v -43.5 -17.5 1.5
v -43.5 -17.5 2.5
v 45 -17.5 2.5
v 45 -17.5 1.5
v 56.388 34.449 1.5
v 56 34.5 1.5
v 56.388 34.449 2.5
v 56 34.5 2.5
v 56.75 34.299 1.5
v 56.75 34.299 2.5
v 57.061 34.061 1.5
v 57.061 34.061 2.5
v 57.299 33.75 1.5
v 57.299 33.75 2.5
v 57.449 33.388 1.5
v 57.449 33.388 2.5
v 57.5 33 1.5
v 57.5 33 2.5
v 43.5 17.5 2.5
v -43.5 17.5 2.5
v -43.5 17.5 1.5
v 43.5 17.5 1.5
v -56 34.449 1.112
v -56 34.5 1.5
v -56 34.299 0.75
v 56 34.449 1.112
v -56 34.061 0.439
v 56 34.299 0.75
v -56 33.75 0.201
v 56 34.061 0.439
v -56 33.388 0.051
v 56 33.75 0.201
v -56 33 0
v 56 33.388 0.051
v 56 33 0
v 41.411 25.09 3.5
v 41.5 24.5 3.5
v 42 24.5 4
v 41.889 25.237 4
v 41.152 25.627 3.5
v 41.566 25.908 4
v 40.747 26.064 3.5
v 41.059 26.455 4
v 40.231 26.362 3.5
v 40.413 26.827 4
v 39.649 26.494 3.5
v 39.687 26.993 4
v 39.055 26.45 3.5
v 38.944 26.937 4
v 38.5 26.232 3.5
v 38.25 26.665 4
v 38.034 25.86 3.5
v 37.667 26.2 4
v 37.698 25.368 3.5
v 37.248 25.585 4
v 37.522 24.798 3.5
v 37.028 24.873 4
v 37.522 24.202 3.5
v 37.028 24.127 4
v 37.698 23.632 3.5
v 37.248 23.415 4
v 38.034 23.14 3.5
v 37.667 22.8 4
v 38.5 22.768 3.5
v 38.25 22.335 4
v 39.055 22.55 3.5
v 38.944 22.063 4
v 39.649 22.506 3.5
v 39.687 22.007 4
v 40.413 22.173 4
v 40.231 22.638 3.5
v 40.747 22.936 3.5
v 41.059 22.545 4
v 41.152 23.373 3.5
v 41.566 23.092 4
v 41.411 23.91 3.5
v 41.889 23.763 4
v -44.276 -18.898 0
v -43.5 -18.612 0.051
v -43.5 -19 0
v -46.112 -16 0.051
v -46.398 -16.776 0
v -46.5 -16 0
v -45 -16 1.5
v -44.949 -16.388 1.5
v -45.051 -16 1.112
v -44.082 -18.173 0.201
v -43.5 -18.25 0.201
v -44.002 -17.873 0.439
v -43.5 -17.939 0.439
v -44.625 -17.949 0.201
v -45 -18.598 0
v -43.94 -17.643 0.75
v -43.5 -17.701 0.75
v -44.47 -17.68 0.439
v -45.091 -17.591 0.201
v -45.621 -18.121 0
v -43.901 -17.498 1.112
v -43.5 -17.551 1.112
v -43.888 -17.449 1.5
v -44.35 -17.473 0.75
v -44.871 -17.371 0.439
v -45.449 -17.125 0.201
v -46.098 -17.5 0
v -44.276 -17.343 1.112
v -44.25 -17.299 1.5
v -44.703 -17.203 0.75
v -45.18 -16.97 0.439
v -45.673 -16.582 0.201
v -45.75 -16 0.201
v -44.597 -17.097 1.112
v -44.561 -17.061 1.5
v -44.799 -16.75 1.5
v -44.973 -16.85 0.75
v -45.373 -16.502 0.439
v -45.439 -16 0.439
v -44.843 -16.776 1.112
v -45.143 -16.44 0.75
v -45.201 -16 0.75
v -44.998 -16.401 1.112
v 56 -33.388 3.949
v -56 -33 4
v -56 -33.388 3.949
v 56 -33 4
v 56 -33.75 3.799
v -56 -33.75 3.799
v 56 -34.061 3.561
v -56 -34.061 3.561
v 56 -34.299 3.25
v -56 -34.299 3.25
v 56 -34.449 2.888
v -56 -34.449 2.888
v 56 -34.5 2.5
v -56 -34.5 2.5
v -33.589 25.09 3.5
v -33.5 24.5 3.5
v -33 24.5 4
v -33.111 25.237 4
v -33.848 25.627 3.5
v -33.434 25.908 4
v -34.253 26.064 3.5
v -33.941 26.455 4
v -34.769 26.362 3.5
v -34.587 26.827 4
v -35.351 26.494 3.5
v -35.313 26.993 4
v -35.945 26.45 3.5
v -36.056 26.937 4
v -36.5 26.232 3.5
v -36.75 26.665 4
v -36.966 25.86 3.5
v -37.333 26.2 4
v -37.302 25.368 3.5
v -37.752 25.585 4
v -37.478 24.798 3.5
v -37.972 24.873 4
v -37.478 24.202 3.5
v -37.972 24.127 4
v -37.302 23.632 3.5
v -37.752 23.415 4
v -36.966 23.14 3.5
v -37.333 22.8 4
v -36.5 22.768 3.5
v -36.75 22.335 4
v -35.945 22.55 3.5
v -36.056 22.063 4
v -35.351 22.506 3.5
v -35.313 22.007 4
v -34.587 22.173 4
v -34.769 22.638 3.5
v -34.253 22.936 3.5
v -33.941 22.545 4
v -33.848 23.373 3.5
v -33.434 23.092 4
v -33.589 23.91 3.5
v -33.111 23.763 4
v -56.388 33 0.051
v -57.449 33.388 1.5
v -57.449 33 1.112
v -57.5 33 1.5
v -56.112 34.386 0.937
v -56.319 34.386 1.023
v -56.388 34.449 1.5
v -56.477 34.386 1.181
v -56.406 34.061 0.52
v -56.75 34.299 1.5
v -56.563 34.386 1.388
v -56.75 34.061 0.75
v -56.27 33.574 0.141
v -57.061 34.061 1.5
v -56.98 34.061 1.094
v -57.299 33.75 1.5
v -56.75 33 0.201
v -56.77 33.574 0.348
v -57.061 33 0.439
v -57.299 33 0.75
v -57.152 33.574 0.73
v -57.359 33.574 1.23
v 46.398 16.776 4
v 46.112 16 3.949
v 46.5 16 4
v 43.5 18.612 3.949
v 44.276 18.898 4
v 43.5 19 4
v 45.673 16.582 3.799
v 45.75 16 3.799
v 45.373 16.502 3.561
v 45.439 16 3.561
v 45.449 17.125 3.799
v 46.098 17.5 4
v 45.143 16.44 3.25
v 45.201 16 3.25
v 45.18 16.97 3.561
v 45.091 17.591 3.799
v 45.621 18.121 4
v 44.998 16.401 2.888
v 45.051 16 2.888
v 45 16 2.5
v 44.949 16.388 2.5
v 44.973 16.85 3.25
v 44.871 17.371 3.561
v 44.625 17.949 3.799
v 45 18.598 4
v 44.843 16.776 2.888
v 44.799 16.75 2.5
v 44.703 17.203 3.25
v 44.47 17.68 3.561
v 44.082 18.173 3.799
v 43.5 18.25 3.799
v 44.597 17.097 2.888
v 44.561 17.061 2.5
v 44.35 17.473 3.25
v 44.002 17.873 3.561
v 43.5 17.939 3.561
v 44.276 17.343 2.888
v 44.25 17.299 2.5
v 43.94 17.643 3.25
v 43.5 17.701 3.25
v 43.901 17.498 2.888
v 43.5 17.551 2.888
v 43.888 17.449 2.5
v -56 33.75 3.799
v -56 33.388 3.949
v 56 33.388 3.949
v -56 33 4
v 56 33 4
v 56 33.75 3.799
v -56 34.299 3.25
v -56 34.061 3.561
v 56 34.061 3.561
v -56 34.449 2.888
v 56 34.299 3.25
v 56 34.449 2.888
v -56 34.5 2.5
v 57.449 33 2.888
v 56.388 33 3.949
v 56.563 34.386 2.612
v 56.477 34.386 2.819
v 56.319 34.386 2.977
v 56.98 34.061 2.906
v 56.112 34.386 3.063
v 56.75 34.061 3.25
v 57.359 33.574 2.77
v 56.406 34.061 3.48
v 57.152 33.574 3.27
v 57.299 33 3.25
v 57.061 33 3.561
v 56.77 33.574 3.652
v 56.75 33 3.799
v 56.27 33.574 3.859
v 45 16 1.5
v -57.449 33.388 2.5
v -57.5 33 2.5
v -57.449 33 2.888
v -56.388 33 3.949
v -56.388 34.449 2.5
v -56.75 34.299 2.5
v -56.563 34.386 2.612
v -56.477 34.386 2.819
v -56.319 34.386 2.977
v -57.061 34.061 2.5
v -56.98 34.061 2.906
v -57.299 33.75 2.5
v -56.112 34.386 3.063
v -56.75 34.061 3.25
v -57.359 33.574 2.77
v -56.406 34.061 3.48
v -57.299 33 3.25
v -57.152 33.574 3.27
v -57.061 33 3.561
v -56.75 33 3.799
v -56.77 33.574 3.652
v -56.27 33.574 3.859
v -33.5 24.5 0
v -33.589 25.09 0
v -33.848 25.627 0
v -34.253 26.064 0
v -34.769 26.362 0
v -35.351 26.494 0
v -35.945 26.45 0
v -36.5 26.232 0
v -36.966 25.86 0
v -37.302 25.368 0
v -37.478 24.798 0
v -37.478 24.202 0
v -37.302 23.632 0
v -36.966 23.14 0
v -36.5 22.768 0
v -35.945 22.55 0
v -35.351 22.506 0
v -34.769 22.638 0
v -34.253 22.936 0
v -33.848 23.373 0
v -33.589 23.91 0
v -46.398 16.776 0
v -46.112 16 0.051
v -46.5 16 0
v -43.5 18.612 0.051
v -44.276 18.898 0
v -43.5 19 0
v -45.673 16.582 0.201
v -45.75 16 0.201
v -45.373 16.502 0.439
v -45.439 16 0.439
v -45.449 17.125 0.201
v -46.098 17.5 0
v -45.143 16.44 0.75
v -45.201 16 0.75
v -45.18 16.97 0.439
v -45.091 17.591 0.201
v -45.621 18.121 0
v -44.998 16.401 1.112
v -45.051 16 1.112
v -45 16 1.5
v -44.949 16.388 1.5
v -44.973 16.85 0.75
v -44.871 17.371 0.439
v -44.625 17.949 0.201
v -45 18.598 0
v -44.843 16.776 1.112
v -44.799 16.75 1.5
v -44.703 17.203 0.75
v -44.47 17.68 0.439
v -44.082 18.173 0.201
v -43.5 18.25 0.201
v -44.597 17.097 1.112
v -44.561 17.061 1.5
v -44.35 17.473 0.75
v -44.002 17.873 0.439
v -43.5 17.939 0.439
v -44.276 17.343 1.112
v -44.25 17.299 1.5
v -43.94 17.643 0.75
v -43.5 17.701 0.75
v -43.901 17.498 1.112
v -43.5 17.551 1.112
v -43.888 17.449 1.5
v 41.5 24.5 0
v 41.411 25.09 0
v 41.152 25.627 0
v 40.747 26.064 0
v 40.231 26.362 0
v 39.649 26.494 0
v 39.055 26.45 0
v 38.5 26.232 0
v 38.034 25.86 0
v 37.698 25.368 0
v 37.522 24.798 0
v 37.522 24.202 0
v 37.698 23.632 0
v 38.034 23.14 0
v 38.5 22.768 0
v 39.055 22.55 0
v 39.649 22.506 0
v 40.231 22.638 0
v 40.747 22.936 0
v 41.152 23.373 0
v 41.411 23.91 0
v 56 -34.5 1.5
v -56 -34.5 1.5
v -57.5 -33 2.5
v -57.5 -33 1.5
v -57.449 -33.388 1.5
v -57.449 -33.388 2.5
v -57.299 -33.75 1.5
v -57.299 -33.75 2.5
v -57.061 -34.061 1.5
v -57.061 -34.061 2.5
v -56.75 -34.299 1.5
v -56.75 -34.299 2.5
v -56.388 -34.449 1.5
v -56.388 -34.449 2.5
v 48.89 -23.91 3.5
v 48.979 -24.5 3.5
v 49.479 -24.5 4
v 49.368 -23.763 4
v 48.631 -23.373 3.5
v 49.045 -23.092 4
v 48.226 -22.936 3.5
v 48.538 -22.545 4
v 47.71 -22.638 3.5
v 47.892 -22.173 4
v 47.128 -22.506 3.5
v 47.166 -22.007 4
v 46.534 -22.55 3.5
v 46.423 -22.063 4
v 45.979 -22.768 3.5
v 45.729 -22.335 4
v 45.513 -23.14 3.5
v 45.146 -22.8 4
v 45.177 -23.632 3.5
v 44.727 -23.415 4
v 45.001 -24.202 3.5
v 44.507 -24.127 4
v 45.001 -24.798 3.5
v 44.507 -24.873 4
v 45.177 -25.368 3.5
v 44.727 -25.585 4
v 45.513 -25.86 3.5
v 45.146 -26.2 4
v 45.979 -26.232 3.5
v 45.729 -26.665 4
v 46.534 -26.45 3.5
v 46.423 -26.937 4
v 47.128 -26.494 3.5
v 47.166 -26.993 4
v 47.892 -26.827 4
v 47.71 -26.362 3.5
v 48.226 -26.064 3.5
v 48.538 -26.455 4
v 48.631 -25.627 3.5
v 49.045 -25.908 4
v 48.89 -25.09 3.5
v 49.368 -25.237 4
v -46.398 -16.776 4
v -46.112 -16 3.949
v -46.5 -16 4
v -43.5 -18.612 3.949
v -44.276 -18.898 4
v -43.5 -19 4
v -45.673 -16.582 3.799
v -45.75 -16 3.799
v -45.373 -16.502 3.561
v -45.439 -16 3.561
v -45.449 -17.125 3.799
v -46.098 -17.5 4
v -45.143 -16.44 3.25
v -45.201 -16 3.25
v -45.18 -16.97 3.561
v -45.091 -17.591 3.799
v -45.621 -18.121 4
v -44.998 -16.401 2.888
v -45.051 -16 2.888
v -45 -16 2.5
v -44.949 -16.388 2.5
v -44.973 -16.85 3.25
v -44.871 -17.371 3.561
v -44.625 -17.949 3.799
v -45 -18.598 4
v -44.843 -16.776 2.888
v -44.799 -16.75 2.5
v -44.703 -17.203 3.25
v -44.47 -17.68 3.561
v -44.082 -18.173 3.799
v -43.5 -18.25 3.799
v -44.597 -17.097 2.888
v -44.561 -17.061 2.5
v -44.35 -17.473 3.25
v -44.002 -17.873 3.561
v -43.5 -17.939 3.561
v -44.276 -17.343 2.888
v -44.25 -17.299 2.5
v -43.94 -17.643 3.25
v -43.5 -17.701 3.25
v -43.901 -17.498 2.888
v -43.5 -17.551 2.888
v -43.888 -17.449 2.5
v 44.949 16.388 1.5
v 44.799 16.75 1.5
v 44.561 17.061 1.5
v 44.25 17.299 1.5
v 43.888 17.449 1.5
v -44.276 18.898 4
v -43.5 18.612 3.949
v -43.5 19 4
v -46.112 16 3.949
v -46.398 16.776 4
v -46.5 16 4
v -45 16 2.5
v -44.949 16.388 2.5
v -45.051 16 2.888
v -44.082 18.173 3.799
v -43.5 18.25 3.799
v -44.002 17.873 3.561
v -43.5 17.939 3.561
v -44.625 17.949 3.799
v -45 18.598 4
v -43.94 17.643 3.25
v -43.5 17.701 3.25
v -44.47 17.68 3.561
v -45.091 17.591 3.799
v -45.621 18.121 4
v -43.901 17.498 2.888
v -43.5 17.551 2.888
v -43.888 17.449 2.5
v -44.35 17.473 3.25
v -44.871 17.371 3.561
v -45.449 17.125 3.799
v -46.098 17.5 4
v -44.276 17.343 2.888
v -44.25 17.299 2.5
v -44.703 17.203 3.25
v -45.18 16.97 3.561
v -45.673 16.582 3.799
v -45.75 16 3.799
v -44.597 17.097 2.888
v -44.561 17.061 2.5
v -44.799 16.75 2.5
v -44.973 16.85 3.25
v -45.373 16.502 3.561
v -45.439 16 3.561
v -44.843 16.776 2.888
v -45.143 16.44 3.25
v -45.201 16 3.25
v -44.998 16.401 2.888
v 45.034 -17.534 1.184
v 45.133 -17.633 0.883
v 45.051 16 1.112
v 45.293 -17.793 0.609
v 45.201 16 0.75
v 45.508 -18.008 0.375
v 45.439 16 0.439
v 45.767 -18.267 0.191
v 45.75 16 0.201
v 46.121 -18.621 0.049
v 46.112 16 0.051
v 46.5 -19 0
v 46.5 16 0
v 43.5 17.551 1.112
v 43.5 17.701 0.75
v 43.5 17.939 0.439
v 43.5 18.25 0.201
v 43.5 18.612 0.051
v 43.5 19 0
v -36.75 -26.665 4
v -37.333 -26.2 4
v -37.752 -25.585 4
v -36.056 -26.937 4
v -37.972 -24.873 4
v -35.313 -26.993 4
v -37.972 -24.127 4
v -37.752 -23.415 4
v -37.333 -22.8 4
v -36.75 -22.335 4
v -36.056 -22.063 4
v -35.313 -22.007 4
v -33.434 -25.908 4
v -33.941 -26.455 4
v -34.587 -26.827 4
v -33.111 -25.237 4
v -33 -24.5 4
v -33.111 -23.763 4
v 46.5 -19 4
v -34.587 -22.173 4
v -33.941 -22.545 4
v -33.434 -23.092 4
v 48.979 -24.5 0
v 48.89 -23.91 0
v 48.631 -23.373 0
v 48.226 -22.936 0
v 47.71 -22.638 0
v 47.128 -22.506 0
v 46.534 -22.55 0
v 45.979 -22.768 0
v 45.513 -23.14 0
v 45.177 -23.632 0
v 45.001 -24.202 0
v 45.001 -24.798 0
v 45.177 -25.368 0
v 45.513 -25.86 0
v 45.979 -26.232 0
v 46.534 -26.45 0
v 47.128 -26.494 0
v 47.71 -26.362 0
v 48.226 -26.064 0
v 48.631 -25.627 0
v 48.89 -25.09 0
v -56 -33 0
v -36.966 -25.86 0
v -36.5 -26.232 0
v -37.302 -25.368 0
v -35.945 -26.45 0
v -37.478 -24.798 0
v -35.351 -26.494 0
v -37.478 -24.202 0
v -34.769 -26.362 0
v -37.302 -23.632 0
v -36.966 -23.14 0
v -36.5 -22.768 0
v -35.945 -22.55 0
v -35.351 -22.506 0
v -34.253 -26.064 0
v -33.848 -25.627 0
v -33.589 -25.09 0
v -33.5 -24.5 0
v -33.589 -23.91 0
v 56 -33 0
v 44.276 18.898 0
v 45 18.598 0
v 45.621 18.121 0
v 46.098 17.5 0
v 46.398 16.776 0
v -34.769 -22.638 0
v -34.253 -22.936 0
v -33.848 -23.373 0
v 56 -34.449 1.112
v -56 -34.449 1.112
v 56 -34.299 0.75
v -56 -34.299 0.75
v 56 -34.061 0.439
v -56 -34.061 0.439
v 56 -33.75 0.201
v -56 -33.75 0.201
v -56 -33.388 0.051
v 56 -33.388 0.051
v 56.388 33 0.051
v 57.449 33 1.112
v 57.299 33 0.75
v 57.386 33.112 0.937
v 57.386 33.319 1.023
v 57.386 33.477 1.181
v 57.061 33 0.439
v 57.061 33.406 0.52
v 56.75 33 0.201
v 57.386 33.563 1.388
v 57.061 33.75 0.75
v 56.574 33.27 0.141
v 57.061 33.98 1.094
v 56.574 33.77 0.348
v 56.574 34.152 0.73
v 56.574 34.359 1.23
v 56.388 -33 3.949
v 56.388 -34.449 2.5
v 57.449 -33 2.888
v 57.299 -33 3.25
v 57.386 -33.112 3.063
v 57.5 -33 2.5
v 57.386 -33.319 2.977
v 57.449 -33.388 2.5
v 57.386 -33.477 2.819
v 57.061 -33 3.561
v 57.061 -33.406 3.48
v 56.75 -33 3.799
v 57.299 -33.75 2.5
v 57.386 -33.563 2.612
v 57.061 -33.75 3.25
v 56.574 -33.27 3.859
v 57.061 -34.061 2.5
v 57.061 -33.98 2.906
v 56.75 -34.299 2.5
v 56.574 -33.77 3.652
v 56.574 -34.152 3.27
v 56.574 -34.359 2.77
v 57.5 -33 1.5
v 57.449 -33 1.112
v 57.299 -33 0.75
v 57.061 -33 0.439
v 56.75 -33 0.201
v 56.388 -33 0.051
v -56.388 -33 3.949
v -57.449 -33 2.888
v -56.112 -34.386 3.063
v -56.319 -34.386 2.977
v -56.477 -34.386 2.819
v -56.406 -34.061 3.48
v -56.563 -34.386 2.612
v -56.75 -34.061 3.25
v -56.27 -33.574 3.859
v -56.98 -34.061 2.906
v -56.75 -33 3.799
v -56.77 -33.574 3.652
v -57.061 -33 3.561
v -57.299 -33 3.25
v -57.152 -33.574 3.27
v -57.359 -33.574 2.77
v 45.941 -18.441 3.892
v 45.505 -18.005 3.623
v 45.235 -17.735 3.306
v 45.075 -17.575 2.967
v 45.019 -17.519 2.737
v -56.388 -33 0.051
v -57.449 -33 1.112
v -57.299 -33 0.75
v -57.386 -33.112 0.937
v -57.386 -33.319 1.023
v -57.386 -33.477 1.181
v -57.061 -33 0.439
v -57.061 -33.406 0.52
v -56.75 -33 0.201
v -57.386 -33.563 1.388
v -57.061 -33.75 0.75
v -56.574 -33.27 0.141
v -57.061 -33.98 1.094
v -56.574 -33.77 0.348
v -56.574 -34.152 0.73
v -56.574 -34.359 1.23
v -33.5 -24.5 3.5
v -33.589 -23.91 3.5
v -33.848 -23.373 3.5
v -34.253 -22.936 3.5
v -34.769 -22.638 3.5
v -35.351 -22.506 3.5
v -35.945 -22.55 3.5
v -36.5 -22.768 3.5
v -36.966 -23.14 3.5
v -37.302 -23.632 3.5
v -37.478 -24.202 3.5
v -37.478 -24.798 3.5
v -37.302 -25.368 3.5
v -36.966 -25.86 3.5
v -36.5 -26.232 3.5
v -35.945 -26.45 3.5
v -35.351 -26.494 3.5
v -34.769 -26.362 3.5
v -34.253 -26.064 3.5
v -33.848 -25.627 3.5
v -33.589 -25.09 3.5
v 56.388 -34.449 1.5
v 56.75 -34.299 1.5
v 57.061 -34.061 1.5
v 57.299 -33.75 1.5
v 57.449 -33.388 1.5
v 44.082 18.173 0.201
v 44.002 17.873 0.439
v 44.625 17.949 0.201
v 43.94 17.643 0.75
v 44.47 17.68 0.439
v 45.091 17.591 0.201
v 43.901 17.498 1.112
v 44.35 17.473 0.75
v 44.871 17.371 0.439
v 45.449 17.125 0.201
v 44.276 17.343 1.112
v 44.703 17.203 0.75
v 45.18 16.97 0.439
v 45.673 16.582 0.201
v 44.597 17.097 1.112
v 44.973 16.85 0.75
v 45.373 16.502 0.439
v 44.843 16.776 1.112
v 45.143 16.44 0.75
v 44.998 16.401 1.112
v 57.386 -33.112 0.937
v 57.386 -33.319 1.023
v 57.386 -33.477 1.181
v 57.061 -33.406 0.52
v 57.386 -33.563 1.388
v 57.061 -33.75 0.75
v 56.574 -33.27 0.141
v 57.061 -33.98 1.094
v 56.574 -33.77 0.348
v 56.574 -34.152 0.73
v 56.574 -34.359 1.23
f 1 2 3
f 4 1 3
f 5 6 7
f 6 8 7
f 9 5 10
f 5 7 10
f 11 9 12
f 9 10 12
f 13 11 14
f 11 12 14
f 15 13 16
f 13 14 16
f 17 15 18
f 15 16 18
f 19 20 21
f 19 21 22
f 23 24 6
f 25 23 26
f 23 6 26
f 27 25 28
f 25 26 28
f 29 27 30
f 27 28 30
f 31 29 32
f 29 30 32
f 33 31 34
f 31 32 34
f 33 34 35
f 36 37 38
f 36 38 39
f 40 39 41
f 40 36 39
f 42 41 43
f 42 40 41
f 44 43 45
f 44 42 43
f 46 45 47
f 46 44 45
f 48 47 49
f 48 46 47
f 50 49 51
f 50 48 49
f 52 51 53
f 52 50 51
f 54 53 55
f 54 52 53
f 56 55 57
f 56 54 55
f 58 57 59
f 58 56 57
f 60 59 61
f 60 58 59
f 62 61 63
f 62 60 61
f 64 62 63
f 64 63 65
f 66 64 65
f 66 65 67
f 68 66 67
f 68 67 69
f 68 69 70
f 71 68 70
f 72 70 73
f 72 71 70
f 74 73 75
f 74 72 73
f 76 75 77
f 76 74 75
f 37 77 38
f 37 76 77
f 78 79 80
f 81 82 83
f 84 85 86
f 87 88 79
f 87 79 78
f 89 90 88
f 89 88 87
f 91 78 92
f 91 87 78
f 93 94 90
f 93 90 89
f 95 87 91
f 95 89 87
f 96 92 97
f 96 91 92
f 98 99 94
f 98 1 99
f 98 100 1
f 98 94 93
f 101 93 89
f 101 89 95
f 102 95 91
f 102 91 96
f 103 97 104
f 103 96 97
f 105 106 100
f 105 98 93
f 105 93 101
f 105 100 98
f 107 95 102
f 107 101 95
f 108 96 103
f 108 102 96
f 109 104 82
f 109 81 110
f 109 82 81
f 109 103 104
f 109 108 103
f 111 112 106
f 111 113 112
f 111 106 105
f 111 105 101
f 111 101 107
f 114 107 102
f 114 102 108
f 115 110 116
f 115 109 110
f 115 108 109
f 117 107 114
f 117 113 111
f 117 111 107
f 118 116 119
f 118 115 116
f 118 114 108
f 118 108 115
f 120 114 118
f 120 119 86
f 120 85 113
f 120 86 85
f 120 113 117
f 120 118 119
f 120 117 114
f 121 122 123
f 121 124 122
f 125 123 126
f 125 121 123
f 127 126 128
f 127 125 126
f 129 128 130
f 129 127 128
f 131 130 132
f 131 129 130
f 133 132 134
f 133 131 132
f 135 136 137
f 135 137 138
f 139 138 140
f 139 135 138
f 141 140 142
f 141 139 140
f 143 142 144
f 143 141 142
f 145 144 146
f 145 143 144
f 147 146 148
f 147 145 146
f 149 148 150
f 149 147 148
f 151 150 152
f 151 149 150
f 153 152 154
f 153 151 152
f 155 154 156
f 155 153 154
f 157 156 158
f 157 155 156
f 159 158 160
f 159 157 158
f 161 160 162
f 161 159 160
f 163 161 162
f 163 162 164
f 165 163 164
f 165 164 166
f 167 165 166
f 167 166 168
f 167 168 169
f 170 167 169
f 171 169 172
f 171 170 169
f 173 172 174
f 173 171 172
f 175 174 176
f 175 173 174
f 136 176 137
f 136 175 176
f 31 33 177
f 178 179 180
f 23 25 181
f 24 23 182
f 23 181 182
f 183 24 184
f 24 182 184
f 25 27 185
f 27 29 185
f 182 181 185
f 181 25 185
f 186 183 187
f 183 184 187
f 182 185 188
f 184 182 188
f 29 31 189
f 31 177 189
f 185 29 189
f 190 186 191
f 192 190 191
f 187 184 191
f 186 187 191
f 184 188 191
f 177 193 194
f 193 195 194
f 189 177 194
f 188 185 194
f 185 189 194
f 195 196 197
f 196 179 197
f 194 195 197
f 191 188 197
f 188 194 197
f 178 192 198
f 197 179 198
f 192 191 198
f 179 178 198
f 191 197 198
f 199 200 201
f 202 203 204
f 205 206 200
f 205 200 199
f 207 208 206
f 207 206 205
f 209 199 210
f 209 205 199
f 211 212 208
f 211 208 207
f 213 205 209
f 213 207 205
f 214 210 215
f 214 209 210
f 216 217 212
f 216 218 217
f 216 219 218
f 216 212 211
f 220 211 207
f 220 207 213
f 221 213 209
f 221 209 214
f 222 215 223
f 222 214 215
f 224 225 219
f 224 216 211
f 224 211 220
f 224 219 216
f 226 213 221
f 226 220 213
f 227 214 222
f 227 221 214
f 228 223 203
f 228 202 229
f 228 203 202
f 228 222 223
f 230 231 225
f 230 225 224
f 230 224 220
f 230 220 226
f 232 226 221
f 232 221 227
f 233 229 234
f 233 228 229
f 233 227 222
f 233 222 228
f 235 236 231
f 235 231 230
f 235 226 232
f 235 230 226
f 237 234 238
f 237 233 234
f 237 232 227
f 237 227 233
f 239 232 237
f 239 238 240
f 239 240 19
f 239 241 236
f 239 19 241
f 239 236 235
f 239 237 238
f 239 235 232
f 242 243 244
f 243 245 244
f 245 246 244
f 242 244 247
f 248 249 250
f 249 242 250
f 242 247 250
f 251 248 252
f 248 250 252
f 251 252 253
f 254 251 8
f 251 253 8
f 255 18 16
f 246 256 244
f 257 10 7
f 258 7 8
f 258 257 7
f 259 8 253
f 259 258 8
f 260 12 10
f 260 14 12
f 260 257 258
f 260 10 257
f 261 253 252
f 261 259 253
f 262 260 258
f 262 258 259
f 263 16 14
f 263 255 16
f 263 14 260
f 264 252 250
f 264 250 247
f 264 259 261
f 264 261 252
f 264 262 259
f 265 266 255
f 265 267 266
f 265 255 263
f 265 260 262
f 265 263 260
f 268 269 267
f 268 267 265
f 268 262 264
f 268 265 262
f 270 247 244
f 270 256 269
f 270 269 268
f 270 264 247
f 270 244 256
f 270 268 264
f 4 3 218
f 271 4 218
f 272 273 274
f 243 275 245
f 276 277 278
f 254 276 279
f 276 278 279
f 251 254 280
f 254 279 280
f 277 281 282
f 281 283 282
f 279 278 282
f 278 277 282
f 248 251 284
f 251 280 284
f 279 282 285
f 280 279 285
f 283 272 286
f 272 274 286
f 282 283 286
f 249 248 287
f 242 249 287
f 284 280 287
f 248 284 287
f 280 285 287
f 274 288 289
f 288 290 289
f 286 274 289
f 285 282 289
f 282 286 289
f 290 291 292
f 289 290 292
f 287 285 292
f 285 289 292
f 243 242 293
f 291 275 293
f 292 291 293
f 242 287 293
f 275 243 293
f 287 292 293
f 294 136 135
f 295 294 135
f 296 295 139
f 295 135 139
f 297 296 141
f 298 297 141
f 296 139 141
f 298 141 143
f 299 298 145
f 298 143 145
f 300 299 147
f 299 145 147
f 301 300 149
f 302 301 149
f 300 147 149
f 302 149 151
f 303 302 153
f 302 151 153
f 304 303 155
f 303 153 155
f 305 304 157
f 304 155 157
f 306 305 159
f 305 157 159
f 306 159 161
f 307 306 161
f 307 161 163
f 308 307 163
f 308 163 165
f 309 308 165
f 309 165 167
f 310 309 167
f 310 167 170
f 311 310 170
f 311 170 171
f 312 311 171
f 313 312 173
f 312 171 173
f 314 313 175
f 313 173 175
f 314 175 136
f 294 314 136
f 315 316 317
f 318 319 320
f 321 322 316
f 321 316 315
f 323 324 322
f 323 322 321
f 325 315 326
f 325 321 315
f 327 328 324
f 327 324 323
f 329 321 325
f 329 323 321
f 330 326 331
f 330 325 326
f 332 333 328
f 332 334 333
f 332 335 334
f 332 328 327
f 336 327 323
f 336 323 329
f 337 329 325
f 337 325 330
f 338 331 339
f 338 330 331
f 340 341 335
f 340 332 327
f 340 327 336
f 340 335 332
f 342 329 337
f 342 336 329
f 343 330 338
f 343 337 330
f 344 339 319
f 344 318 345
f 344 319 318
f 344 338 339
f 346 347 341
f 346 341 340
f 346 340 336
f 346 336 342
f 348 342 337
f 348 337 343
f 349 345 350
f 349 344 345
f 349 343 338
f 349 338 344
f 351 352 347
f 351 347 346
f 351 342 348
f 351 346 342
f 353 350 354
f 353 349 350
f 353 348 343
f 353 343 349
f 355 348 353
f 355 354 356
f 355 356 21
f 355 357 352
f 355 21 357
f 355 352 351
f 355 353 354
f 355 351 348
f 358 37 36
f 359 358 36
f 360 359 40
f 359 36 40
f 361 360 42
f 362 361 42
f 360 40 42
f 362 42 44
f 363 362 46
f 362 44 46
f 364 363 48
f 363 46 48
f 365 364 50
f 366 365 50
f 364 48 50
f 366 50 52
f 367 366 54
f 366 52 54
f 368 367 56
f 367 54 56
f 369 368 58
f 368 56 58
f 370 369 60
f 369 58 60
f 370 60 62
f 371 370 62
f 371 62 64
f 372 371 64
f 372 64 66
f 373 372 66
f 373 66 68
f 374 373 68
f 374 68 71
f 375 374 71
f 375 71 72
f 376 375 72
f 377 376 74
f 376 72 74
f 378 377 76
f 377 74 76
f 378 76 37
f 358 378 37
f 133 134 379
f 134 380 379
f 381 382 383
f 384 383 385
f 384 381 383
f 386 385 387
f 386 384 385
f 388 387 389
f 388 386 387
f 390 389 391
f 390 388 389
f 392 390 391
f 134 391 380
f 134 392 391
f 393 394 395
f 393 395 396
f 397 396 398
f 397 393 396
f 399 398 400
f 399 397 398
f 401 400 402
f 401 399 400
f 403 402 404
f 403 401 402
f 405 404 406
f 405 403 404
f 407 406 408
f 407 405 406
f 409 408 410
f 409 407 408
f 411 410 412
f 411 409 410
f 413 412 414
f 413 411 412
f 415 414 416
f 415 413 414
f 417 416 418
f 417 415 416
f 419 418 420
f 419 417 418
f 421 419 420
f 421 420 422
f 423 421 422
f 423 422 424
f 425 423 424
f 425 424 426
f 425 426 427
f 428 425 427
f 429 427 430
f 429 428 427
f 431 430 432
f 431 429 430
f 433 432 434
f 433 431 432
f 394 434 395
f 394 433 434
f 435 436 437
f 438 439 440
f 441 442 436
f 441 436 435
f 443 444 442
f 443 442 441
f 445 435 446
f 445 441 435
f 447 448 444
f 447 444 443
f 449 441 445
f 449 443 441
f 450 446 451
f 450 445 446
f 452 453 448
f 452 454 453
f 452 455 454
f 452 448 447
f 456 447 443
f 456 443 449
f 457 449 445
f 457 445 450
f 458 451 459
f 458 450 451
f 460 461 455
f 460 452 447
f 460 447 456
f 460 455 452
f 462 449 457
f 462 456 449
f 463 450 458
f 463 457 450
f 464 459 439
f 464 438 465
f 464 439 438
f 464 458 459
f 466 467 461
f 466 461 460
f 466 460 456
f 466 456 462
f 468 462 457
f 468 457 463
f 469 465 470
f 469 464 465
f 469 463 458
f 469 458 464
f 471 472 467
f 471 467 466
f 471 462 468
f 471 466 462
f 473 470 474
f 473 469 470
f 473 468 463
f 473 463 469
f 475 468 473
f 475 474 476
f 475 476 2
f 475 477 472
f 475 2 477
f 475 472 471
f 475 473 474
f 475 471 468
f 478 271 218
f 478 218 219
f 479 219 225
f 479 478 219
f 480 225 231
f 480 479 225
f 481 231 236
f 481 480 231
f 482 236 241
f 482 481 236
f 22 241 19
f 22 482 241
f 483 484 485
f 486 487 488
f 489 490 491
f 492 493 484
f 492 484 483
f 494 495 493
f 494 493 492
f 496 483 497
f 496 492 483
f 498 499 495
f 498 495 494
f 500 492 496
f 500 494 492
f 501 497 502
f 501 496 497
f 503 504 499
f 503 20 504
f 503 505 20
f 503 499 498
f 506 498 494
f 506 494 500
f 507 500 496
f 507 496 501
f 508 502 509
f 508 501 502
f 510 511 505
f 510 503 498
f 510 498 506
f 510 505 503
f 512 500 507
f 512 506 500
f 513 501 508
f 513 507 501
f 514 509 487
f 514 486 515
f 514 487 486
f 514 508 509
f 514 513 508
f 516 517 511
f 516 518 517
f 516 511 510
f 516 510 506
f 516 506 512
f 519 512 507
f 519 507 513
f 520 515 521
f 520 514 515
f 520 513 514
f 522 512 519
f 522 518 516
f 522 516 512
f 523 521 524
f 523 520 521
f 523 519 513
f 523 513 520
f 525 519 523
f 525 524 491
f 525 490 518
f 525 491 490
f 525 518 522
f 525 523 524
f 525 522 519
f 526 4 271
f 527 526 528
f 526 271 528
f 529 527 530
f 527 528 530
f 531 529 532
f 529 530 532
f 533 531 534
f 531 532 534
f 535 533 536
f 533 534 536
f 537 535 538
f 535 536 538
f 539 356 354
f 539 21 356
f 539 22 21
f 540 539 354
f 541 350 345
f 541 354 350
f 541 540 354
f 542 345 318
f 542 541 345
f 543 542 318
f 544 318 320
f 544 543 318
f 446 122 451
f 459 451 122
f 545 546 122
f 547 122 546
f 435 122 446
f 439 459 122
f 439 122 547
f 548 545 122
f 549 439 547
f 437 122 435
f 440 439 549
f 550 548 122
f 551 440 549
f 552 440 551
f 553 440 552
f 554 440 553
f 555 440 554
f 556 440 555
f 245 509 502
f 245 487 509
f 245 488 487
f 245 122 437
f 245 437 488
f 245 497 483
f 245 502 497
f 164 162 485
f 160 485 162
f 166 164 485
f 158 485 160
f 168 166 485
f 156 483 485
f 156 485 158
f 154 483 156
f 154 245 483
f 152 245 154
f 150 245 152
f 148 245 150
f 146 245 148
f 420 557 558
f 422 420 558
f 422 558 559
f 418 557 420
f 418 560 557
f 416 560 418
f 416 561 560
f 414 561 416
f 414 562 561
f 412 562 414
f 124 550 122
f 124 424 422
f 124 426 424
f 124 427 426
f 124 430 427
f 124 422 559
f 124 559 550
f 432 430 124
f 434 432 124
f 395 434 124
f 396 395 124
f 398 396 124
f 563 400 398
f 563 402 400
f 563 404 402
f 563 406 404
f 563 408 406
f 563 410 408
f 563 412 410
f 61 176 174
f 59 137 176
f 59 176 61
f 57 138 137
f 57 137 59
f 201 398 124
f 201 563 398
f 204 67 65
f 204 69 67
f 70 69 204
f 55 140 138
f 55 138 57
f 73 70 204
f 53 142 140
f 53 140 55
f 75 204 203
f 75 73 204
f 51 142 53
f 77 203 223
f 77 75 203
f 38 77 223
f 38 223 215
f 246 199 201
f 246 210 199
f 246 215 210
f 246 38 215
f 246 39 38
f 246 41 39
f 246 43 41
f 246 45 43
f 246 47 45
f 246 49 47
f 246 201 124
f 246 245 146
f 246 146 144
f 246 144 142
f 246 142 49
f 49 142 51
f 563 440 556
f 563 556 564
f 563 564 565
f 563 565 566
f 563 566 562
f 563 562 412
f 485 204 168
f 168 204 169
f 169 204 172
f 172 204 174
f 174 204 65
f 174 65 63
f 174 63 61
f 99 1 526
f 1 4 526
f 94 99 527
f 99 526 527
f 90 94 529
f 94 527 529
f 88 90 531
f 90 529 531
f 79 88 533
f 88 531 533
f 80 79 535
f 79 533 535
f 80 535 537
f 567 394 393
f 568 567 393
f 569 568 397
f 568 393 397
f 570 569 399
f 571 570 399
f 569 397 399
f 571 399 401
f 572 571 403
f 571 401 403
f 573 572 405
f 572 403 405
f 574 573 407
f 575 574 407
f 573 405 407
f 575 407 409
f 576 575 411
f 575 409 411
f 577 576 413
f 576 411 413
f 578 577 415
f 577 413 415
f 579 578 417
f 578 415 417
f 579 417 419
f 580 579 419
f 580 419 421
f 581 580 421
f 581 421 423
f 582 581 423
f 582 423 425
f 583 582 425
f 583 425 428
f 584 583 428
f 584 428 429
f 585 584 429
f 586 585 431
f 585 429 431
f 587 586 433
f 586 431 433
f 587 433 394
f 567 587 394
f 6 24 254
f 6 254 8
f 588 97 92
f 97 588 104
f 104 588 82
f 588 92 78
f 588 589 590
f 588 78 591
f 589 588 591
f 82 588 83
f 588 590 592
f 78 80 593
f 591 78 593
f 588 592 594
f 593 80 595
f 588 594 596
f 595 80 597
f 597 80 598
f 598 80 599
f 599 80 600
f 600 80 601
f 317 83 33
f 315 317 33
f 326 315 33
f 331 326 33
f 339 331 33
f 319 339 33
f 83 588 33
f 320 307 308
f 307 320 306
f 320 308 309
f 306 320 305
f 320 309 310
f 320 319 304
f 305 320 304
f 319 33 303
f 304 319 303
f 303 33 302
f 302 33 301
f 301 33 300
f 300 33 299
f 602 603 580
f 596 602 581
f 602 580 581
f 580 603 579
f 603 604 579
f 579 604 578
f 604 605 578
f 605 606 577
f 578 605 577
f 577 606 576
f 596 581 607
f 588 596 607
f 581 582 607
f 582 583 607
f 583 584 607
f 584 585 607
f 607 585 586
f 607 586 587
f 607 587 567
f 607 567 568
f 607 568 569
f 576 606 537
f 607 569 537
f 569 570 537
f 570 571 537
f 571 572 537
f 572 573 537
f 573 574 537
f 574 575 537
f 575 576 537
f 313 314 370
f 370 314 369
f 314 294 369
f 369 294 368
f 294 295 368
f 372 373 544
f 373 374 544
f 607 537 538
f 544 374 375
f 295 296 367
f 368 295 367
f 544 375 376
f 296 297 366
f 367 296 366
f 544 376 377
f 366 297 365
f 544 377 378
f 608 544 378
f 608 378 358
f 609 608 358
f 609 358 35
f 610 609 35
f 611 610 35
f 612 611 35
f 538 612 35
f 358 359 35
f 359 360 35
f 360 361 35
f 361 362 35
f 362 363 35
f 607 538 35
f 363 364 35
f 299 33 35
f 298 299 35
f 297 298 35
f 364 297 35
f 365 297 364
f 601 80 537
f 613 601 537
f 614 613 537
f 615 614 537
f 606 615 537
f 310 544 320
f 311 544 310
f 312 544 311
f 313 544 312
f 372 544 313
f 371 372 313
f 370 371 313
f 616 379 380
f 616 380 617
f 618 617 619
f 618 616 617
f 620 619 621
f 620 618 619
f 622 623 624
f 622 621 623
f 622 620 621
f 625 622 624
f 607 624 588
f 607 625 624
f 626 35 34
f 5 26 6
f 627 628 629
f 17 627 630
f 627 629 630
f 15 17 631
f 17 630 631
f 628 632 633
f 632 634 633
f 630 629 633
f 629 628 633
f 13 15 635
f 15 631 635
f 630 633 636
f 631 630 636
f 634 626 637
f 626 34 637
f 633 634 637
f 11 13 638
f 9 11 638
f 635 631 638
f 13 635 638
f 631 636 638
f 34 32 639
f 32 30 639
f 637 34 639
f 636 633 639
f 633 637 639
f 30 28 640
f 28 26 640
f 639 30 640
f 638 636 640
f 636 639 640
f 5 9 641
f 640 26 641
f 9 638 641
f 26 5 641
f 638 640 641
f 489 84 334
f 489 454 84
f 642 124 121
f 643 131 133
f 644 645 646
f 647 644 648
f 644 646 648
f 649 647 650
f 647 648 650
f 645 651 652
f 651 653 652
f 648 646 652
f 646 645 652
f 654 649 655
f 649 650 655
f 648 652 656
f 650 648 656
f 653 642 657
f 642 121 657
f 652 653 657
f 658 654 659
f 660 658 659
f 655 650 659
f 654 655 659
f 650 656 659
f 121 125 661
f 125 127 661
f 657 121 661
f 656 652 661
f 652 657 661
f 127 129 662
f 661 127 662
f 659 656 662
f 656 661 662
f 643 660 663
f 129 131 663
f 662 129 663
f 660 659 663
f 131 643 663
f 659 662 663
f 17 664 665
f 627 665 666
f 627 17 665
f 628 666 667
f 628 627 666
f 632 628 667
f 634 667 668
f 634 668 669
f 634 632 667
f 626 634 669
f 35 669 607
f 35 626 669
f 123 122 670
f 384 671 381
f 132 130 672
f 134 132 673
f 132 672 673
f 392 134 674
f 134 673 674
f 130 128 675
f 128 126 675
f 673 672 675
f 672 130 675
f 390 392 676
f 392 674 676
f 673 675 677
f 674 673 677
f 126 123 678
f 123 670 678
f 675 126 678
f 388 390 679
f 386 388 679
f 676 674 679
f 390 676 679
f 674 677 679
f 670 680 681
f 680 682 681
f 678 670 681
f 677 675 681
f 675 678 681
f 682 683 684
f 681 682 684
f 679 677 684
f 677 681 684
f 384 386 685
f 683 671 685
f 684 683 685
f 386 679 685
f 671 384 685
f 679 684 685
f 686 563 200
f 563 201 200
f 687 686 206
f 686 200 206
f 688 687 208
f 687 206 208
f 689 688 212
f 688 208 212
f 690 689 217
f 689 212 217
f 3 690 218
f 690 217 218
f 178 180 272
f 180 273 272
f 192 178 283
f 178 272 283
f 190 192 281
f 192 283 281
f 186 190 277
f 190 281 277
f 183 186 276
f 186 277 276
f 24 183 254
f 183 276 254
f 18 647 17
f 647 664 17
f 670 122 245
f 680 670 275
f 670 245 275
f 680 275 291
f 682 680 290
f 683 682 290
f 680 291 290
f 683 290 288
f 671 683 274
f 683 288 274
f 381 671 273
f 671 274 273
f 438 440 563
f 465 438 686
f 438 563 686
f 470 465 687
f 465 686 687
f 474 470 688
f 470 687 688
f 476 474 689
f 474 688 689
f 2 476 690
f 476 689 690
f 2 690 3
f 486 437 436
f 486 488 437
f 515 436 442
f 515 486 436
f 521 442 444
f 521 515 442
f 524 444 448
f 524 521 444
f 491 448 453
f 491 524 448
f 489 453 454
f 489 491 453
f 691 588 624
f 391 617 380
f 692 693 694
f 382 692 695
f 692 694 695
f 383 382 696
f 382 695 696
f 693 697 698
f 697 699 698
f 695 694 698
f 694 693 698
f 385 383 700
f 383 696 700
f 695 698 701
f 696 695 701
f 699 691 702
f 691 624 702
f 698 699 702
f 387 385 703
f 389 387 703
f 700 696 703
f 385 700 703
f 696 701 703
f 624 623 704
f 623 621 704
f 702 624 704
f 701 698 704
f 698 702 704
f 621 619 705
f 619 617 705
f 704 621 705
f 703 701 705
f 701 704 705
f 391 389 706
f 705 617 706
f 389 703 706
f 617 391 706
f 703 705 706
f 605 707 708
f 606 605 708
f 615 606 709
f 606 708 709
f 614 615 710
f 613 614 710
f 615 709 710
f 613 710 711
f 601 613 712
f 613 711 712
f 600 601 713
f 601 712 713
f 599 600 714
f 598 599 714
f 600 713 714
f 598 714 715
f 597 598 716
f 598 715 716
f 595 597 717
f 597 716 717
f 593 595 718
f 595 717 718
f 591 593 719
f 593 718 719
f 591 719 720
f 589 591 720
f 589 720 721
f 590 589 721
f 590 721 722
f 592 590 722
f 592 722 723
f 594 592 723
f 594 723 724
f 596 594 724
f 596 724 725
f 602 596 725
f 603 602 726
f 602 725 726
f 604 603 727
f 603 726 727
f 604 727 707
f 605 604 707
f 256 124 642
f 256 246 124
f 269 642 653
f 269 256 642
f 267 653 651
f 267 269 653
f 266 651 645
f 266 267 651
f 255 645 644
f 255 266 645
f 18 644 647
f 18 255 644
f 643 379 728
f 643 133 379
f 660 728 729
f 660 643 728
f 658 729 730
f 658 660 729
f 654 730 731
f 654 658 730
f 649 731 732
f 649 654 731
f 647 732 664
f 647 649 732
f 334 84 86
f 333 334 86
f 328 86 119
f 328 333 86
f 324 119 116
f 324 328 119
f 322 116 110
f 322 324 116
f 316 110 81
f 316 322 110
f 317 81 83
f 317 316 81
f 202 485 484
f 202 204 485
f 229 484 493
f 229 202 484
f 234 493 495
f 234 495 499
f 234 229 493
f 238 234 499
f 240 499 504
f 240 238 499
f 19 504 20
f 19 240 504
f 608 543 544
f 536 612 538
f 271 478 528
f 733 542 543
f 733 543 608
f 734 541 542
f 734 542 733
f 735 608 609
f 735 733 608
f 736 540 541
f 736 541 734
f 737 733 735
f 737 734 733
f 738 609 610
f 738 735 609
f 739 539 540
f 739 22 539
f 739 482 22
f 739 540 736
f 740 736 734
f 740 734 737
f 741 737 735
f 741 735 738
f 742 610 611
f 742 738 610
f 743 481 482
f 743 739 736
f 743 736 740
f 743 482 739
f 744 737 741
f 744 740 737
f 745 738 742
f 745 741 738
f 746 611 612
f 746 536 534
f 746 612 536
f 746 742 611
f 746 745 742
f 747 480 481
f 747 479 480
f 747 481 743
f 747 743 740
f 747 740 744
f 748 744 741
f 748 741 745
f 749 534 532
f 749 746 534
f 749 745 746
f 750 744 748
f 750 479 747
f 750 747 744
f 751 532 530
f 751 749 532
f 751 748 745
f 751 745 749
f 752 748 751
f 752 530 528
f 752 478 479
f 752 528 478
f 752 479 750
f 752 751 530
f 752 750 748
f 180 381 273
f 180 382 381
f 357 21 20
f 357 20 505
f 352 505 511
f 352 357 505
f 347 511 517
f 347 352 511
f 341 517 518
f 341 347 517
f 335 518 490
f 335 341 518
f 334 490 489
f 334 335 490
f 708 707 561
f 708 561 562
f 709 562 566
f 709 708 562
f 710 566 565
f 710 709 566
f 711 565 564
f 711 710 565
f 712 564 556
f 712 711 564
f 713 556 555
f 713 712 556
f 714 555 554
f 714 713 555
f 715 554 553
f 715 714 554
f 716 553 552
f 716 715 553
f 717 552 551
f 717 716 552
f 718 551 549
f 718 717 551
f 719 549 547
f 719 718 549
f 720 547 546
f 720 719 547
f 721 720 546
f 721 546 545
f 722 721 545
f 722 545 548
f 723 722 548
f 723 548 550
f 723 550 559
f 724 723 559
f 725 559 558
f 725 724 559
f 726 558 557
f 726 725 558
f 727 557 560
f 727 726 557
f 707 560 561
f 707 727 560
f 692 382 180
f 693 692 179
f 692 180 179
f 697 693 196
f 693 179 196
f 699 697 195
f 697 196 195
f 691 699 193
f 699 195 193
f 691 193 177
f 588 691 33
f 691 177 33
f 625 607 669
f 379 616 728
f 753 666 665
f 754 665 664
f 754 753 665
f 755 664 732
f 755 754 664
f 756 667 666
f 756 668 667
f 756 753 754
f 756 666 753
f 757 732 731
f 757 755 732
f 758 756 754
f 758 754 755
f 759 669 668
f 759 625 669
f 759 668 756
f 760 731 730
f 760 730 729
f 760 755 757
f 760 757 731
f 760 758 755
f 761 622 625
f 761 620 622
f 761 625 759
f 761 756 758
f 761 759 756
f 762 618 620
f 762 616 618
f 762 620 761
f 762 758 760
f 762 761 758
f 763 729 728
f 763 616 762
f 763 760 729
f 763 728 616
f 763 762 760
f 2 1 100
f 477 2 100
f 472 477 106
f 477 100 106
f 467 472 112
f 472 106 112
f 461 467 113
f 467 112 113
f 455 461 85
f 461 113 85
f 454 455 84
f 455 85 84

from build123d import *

# Parameters (mm, degrees)
SKETCH1_W           = 115
SKETCH1_H           = 69
BOSS_EXTRUDE1_DEPTH = 4
SKETCH2_R           = 2
CUT_EXTRUDE1_DEPTH  = 4
SKETCH3_W           = 90
SKETCH3_H           = 35
CUT_EXTRUDE2_DEPTH  = 4
CHAMFER1_SIZE       = 0.5
FILLET1_R           = 1.5


with BuildPart() as part:
    # Sketch1 → Boss-Extrude1 (new body)
    with BuildSketch(Plane.XY):
        Rectangle(SKETCH1_W, SKETCH1_H)
    extrude(amount=BOSS_EXTRUDE1_DEPTH)

    # Sketch2 → Cut-Extrude1 (cut)
    with BuildSketch(Plane.XY.offset(4)):
        with Locations((-35.5, 24.5)):
            Circle(SKETCH2_R)
        with Locations((39.5, 24.5)):
            Circle(SKETCH2_R)
        with Locations((46.979, -24.5)):
            Circle(SKETCH2_R)
        with Locations((-35.5, -24.5)):
            Circle(SKETCH2_R)
    extrude(amount=-CUT_EXTRUDE1_DEPTH, mode=Mode.SUBTRACT)

    # Sketch3 → Cut-Extrude2 (cut)
    with BuildSketch(Plane.XY.offset(4)):
        Rectangle(SKETCH3_W, SKETCH3_H)
    extrude(amount=-CUT_EXTRUDE2_DEPTH, mode=Mode.SUBTRACT)

    # Chamfer1
    chamfer1_edges = [part.edges().sort_by_distance(p)[0] for p in [
        (44.979, -24.5, 4),
        (-37.5, 24.5, 4),
        (-37.5, -24.5, 4),
        (37.5, 24.5, 4),
    ]]
    chamfer(chamfer1_edges, length=CHAMFER1_SIZE)

    # Fillet1
    fillet1_edges = [part.edges().sort_by_distance(p)[0] for p in [
        (-57.5, 0, 4),
        (0, -34.5, 4),
        (45, 0, 0),
        (45, 17.5, 2),
        (0, -17.5, 0),
        (-45, 0, 0),
        (-45, -17.5, 2),
        (0, 17.5, 0),
        (-45, 17.5, 2),
        (45, 0, 4),
        (0, 17.5, 4),
        (-45, 0, 4),
        (0, -17.5, 4),
        (57.5, 0, 4),
        (0, -34.5, 0),
        (-57.5, 0, 0),
        (0, 34.5, 0),
        (57.5, 0, 0),
        (57.5, -34.5, 2),
        (-57.5, -34.5, 2),
        (-57.5, 34.5, 2),
        (57.5, 34.5, 2),
        (0, 34.5, 4),
    ]]
    fillet(fillet1_edges, radius=FILLET1_R)


solid = part.part
